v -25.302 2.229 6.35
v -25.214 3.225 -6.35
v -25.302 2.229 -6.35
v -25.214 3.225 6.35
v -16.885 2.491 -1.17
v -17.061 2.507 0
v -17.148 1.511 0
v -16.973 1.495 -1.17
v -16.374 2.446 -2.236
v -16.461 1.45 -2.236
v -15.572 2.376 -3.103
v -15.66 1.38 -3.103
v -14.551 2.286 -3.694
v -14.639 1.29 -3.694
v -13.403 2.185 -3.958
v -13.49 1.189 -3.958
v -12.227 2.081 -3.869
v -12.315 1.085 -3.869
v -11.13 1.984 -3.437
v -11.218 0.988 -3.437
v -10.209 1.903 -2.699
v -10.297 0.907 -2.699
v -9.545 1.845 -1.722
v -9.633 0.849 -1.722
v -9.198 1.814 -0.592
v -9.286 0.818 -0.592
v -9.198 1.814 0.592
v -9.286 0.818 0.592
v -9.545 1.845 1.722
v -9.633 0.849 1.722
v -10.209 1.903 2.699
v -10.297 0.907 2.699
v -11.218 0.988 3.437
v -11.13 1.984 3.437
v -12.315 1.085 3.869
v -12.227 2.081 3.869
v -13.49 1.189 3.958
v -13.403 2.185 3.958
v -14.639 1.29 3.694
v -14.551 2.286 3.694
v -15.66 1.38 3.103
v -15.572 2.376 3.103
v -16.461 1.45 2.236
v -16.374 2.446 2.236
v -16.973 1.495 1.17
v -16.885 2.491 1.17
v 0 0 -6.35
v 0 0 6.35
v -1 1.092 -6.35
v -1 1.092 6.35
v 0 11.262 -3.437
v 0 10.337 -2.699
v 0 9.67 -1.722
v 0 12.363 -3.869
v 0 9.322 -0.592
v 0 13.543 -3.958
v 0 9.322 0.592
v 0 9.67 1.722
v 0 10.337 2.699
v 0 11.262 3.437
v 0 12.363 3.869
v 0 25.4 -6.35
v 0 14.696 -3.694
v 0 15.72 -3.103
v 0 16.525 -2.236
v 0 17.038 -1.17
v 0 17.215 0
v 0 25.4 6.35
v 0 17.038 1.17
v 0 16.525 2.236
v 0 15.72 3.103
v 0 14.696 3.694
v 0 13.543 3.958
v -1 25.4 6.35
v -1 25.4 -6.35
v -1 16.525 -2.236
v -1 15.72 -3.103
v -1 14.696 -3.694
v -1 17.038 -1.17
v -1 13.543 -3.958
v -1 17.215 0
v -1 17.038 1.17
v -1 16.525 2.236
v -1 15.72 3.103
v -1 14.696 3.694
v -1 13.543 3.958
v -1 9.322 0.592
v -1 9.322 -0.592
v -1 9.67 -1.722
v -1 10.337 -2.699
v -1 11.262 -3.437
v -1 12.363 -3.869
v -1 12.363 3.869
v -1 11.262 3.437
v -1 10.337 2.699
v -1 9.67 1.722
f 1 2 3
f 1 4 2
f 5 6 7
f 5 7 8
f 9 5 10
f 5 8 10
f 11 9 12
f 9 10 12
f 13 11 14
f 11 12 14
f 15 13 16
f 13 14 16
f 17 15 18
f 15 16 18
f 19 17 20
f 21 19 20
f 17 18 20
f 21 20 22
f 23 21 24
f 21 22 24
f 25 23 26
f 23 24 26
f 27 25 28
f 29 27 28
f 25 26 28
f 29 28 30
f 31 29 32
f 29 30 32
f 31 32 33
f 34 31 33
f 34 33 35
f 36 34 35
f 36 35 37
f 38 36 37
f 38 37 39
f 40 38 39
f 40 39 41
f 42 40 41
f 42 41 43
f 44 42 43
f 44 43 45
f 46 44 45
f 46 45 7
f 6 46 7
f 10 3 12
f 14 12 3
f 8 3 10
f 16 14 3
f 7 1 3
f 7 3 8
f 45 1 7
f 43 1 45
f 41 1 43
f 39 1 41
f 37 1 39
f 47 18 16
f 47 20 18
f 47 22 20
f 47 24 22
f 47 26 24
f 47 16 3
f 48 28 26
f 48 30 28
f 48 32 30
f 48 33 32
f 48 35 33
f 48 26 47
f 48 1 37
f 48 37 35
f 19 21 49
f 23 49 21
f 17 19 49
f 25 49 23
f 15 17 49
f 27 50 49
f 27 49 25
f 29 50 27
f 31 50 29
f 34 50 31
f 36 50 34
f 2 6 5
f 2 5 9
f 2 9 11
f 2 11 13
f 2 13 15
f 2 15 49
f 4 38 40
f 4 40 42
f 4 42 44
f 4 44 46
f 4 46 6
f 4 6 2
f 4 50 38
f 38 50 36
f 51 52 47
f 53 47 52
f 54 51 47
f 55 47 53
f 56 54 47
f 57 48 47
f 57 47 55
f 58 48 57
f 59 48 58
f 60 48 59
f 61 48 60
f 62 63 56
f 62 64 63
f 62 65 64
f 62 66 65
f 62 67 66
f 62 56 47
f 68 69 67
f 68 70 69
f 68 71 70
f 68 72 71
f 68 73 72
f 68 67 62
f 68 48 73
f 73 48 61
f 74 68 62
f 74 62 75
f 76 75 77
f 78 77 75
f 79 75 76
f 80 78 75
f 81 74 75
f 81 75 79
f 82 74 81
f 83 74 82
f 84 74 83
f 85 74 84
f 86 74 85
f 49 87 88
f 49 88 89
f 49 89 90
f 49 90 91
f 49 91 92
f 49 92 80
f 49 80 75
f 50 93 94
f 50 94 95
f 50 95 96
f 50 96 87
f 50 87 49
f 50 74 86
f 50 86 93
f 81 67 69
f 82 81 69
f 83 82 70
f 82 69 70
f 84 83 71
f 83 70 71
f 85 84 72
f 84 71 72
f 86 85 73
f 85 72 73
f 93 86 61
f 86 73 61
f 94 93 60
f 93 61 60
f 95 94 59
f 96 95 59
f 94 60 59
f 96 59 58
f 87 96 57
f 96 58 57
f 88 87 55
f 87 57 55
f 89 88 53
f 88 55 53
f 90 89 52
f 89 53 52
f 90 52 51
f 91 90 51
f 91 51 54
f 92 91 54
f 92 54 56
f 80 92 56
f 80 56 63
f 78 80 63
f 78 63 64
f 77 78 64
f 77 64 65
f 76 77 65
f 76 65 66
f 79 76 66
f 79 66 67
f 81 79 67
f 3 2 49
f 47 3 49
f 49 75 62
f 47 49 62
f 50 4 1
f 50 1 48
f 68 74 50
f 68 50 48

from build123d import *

# Parameters (mm, degrees)
BOSS_EXTRUDE1_DEPTH            = 6.35
F_5_16_0_3125_DIAMETER_HOLE1_D = 7.9375
F_5_16_0_3125_DIAMETER_HOLE2_D = 7.9375


with BuildPart() as part:
    # Sketch1 → Boss-Extrude1 (new body, symmetric)
    with BuildSketch(Plane.XY):
        Polygon((0, 0), (0, 25.4), (-1, 25.4), (-1, 1.091974256), (-25.214234797, 3.225269541), (-25.301995741, 2.229127977), align=None)
    extrude(amount=BOSS_EXTRUDE1_DEPTH, both=True)

    # 5/16 (0.3125) Diameter Hole1 (through all)
    with Locations(Plane(origin=(-1, 13.245987128, 0), x_dir=(0, -1, 0), z_dir=(-1, 0, 0))):
        with Locations((0, 0)):
            Hole(F_5_16_0_3125_DIAMETER_HOLE1_D / 2)

    # 5/16 (0.3125) Diameter Hole2 (through all)
    with Locations(Plane(origin=(-13.107117398, 2.158621899, 0), x_dir=(0.996141565, -0.087760944, 0), z_dir=(0.087760944, 0.996141565, 0))):
        with Locations((0, 0)):
            Hole(F_5_16_0_3125_DIAMETER_HOLE2_D / 2)


solid = part.part
